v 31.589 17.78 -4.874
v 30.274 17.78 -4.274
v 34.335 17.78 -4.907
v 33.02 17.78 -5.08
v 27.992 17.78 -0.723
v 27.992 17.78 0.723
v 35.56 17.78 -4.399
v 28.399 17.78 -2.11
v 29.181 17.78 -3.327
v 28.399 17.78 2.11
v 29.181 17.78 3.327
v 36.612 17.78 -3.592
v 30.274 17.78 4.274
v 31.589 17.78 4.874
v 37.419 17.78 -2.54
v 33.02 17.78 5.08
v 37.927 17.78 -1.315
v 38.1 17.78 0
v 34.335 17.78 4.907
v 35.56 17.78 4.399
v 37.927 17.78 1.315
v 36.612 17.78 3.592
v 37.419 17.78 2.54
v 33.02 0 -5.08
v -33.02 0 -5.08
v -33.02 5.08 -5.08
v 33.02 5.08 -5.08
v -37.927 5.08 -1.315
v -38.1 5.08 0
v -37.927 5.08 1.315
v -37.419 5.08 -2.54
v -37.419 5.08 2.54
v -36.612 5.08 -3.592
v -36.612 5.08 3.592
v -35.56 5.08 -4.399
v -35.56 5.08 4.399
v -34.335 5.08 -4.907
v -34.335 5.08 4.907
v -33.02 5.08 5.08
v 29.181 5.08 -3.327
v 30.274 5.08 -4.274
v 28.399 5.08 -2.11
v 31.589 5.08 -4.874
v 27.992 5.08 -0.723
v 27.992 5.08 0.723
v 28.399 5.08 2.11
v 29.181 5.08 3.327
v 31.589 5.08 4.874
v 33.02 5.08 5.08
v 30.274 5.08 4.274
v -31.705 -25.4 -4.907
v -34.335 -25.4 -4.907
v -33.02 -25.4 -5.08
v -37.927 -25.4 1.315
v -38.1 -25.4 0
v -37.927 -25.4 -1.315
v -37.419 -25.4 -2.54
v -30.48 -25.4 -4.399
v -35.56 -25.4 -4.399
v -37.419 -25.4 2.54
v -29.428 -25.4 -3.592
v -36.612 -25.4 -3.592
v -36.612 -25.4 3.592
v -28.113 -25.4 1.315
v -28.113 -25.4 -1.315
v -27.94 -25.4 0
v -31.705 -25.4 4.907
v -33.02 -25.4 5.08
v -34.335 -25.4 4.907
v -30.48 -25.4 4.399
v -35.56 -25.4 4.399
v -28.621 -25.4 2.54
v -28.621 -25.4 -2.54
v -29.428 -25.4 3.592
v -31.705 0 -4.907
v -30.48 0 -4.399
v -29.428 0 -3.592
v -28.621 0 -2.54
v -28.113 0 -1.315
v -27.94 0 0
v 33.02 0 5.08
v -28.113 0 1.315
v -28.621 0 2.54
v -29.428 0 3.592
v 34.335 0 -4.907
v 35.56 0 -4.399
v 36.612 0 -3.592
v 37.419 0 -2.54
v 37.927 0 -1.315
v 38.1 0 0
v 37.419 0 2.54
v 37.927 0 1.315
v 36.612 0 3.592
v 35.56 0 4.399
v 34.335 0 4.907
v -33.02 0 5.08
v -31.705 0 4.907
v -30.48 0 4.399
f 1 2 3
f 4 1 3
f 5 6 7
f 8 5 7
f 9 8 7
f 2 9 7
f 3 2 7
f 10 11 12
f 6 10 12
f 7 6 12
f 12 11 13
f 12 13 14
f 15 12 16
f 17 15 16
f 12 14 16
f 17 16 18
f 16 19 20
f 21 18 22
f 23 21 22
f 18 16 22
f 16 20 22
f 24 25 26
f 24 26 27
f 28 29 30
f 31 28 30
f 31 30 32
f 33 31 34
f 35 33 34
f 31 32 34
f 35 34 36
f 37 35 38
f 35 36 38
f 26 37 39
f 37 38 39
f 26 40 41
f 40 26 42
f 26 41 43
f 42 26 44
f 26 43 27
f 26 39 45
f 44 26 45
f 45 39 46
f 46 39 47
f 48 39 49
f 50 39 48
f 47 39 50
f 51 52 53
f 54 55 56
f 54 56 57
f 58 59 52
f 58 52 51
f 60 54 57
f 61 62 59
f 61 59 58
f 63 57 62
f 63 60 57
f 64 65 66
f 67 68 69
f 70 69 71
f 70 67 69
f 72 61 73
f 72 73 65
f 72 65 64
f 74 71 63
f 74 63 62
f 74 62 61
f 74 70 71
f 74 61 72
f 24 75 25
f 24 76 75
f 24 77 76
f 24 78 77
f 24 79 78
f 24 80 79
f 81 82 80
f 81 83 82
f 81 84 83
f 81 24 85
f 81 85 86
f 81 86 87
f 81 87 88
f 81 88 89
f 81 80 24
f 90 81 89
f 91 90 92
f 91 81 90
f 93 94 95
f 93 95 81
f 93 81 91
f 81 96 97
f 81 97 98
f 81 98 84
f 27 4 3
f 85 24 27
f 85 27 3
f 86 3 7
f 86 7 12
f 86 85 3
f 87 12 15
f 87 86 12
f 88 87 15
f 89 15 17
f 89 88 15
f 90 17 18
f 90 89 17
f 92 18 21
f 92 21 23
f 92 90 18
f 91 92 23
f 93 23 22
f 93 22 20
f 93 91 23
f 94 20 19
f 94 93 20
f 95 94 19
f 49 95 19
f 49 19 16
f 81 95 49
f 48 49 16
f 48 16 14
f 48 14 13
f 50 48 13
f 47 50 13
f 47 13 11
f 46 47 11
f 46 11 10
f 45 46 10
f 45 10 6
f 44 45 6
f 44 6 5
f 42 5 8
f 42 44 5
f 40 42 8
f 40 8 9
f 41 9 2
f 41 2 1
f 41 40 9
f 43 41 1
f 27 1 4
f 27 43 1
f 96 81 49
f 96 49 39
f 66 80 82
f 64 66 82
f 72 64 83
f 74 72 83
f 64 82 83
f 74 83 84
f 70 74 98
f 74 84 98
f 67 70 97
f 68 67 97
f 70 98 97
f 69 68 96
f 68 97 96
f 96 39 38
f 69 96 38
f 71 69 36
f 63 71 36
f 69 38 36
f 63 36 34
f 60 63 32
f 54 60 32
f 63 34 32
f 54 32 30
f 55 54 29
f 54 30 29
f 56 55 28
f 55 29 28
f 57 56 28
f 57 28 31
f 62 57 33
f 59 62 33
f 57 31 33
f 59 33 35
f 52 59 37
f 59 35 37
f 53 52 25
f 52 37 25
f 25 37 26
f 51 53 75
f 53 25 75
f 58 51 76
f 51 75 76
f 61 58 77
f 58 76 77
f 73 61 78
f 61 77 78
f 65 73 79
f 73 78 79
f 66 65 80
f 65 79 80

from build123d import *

# Parameters (mm, degrees)
F1_DEPTH = 5.08
F2_DEPTH = 25.4
F3_DEPTH = 17.78


with BuildPart() as f1:
    # F0 (on Front) → F1 (new body)
    with BuildSketch(Plane.XZ):
        with BuildLine():
            ThreePointArc((-27.94, 0), (-29.4278975516, 3.5921024484), (-33.02, 5.08))
            ThreePointArc((-33.02, 5.08), (-36.6121024484, 3.5921024484), (-38.1, 0))
            ThreePointArc((-38.1, 0), (-36.6121024484, -3.5921024484), (-33.02, -5.08))
            ThreePointArc((-33.02, -5.08), (-29.4278975516, -3.5921024484), (-27.94, 0))
        make_face()
        with BuildLine():
            Line((33.019999962, 5.08), (-33.02, 5.08))
            ThreePointArc((-33.02, 5.08), (-29.4278975516, 3.5921024484), (-27.94, 0))
            ThreePointArc((-27.94, 0), (-29.4278975516, -3.5921024484), (-33.02, -5.08))
            Line((-33.02, -5.08), (33.02, -5.08))
            ThreePointArc((33.02, -5.08), (27.94, -1.9e-08), (33.019999962, 5.08))
        make_face()
        with BuildLine():
            ThreePointArc((38.1, 0), (36.612102435, 3.5921024619), (33.019999962, 5.08))
            ThreePointArc((33.019999962, 5.08), (27.94, -1.9e-08), (33.02, -5.08))
            ThreePointArc((33.02, -5.08), (36.6121024484, -3.5921024484), (38.1, 0))
        make_face()
    extrude(amount=-F1_DEPTH)

    # F0 (on Front) → F2 (join)
    with BuildSketch(Plane.XZ):
        with BuildLine():
            ThreePointArc((-27.94, 0), (-29.4278975516, 3.5921024484), (-33.02, 5.08))
            ThreePointArc((-33.02, 5.08), (-36.6121024484, 3.5921024484), (-38.1, 0))
            ThreePointArc((-38.1, 0), (-36.6121024484, -3.5921024484), (-33.02, -5.08))
            ThreePointArc((-33.02, -5.08), (-29.4278975516, -3.5921024484), (-27.94, 0))
        make_face()
    extrude(amount=F2_DEPTH)

    # F0 (on Front) → F3 (join)
    with BuildSketch(Plane.XZ):
        with BuildLine():
            ThreePointArc((38.1, 0), (36.612102435, 3.5921024619), (33.019999962, 5.08))
            ThreePointArc((33.019999962, 5.08), (27.94, -1.9e-08), (33.02, -5.08))
            ThreePointArc((33.02, -5.08), (36.6121024484, -3.5921024484), (38.1, 0))
        make_face()
    extrude(amount=-F3_DEPTH)


solid = f1.part
